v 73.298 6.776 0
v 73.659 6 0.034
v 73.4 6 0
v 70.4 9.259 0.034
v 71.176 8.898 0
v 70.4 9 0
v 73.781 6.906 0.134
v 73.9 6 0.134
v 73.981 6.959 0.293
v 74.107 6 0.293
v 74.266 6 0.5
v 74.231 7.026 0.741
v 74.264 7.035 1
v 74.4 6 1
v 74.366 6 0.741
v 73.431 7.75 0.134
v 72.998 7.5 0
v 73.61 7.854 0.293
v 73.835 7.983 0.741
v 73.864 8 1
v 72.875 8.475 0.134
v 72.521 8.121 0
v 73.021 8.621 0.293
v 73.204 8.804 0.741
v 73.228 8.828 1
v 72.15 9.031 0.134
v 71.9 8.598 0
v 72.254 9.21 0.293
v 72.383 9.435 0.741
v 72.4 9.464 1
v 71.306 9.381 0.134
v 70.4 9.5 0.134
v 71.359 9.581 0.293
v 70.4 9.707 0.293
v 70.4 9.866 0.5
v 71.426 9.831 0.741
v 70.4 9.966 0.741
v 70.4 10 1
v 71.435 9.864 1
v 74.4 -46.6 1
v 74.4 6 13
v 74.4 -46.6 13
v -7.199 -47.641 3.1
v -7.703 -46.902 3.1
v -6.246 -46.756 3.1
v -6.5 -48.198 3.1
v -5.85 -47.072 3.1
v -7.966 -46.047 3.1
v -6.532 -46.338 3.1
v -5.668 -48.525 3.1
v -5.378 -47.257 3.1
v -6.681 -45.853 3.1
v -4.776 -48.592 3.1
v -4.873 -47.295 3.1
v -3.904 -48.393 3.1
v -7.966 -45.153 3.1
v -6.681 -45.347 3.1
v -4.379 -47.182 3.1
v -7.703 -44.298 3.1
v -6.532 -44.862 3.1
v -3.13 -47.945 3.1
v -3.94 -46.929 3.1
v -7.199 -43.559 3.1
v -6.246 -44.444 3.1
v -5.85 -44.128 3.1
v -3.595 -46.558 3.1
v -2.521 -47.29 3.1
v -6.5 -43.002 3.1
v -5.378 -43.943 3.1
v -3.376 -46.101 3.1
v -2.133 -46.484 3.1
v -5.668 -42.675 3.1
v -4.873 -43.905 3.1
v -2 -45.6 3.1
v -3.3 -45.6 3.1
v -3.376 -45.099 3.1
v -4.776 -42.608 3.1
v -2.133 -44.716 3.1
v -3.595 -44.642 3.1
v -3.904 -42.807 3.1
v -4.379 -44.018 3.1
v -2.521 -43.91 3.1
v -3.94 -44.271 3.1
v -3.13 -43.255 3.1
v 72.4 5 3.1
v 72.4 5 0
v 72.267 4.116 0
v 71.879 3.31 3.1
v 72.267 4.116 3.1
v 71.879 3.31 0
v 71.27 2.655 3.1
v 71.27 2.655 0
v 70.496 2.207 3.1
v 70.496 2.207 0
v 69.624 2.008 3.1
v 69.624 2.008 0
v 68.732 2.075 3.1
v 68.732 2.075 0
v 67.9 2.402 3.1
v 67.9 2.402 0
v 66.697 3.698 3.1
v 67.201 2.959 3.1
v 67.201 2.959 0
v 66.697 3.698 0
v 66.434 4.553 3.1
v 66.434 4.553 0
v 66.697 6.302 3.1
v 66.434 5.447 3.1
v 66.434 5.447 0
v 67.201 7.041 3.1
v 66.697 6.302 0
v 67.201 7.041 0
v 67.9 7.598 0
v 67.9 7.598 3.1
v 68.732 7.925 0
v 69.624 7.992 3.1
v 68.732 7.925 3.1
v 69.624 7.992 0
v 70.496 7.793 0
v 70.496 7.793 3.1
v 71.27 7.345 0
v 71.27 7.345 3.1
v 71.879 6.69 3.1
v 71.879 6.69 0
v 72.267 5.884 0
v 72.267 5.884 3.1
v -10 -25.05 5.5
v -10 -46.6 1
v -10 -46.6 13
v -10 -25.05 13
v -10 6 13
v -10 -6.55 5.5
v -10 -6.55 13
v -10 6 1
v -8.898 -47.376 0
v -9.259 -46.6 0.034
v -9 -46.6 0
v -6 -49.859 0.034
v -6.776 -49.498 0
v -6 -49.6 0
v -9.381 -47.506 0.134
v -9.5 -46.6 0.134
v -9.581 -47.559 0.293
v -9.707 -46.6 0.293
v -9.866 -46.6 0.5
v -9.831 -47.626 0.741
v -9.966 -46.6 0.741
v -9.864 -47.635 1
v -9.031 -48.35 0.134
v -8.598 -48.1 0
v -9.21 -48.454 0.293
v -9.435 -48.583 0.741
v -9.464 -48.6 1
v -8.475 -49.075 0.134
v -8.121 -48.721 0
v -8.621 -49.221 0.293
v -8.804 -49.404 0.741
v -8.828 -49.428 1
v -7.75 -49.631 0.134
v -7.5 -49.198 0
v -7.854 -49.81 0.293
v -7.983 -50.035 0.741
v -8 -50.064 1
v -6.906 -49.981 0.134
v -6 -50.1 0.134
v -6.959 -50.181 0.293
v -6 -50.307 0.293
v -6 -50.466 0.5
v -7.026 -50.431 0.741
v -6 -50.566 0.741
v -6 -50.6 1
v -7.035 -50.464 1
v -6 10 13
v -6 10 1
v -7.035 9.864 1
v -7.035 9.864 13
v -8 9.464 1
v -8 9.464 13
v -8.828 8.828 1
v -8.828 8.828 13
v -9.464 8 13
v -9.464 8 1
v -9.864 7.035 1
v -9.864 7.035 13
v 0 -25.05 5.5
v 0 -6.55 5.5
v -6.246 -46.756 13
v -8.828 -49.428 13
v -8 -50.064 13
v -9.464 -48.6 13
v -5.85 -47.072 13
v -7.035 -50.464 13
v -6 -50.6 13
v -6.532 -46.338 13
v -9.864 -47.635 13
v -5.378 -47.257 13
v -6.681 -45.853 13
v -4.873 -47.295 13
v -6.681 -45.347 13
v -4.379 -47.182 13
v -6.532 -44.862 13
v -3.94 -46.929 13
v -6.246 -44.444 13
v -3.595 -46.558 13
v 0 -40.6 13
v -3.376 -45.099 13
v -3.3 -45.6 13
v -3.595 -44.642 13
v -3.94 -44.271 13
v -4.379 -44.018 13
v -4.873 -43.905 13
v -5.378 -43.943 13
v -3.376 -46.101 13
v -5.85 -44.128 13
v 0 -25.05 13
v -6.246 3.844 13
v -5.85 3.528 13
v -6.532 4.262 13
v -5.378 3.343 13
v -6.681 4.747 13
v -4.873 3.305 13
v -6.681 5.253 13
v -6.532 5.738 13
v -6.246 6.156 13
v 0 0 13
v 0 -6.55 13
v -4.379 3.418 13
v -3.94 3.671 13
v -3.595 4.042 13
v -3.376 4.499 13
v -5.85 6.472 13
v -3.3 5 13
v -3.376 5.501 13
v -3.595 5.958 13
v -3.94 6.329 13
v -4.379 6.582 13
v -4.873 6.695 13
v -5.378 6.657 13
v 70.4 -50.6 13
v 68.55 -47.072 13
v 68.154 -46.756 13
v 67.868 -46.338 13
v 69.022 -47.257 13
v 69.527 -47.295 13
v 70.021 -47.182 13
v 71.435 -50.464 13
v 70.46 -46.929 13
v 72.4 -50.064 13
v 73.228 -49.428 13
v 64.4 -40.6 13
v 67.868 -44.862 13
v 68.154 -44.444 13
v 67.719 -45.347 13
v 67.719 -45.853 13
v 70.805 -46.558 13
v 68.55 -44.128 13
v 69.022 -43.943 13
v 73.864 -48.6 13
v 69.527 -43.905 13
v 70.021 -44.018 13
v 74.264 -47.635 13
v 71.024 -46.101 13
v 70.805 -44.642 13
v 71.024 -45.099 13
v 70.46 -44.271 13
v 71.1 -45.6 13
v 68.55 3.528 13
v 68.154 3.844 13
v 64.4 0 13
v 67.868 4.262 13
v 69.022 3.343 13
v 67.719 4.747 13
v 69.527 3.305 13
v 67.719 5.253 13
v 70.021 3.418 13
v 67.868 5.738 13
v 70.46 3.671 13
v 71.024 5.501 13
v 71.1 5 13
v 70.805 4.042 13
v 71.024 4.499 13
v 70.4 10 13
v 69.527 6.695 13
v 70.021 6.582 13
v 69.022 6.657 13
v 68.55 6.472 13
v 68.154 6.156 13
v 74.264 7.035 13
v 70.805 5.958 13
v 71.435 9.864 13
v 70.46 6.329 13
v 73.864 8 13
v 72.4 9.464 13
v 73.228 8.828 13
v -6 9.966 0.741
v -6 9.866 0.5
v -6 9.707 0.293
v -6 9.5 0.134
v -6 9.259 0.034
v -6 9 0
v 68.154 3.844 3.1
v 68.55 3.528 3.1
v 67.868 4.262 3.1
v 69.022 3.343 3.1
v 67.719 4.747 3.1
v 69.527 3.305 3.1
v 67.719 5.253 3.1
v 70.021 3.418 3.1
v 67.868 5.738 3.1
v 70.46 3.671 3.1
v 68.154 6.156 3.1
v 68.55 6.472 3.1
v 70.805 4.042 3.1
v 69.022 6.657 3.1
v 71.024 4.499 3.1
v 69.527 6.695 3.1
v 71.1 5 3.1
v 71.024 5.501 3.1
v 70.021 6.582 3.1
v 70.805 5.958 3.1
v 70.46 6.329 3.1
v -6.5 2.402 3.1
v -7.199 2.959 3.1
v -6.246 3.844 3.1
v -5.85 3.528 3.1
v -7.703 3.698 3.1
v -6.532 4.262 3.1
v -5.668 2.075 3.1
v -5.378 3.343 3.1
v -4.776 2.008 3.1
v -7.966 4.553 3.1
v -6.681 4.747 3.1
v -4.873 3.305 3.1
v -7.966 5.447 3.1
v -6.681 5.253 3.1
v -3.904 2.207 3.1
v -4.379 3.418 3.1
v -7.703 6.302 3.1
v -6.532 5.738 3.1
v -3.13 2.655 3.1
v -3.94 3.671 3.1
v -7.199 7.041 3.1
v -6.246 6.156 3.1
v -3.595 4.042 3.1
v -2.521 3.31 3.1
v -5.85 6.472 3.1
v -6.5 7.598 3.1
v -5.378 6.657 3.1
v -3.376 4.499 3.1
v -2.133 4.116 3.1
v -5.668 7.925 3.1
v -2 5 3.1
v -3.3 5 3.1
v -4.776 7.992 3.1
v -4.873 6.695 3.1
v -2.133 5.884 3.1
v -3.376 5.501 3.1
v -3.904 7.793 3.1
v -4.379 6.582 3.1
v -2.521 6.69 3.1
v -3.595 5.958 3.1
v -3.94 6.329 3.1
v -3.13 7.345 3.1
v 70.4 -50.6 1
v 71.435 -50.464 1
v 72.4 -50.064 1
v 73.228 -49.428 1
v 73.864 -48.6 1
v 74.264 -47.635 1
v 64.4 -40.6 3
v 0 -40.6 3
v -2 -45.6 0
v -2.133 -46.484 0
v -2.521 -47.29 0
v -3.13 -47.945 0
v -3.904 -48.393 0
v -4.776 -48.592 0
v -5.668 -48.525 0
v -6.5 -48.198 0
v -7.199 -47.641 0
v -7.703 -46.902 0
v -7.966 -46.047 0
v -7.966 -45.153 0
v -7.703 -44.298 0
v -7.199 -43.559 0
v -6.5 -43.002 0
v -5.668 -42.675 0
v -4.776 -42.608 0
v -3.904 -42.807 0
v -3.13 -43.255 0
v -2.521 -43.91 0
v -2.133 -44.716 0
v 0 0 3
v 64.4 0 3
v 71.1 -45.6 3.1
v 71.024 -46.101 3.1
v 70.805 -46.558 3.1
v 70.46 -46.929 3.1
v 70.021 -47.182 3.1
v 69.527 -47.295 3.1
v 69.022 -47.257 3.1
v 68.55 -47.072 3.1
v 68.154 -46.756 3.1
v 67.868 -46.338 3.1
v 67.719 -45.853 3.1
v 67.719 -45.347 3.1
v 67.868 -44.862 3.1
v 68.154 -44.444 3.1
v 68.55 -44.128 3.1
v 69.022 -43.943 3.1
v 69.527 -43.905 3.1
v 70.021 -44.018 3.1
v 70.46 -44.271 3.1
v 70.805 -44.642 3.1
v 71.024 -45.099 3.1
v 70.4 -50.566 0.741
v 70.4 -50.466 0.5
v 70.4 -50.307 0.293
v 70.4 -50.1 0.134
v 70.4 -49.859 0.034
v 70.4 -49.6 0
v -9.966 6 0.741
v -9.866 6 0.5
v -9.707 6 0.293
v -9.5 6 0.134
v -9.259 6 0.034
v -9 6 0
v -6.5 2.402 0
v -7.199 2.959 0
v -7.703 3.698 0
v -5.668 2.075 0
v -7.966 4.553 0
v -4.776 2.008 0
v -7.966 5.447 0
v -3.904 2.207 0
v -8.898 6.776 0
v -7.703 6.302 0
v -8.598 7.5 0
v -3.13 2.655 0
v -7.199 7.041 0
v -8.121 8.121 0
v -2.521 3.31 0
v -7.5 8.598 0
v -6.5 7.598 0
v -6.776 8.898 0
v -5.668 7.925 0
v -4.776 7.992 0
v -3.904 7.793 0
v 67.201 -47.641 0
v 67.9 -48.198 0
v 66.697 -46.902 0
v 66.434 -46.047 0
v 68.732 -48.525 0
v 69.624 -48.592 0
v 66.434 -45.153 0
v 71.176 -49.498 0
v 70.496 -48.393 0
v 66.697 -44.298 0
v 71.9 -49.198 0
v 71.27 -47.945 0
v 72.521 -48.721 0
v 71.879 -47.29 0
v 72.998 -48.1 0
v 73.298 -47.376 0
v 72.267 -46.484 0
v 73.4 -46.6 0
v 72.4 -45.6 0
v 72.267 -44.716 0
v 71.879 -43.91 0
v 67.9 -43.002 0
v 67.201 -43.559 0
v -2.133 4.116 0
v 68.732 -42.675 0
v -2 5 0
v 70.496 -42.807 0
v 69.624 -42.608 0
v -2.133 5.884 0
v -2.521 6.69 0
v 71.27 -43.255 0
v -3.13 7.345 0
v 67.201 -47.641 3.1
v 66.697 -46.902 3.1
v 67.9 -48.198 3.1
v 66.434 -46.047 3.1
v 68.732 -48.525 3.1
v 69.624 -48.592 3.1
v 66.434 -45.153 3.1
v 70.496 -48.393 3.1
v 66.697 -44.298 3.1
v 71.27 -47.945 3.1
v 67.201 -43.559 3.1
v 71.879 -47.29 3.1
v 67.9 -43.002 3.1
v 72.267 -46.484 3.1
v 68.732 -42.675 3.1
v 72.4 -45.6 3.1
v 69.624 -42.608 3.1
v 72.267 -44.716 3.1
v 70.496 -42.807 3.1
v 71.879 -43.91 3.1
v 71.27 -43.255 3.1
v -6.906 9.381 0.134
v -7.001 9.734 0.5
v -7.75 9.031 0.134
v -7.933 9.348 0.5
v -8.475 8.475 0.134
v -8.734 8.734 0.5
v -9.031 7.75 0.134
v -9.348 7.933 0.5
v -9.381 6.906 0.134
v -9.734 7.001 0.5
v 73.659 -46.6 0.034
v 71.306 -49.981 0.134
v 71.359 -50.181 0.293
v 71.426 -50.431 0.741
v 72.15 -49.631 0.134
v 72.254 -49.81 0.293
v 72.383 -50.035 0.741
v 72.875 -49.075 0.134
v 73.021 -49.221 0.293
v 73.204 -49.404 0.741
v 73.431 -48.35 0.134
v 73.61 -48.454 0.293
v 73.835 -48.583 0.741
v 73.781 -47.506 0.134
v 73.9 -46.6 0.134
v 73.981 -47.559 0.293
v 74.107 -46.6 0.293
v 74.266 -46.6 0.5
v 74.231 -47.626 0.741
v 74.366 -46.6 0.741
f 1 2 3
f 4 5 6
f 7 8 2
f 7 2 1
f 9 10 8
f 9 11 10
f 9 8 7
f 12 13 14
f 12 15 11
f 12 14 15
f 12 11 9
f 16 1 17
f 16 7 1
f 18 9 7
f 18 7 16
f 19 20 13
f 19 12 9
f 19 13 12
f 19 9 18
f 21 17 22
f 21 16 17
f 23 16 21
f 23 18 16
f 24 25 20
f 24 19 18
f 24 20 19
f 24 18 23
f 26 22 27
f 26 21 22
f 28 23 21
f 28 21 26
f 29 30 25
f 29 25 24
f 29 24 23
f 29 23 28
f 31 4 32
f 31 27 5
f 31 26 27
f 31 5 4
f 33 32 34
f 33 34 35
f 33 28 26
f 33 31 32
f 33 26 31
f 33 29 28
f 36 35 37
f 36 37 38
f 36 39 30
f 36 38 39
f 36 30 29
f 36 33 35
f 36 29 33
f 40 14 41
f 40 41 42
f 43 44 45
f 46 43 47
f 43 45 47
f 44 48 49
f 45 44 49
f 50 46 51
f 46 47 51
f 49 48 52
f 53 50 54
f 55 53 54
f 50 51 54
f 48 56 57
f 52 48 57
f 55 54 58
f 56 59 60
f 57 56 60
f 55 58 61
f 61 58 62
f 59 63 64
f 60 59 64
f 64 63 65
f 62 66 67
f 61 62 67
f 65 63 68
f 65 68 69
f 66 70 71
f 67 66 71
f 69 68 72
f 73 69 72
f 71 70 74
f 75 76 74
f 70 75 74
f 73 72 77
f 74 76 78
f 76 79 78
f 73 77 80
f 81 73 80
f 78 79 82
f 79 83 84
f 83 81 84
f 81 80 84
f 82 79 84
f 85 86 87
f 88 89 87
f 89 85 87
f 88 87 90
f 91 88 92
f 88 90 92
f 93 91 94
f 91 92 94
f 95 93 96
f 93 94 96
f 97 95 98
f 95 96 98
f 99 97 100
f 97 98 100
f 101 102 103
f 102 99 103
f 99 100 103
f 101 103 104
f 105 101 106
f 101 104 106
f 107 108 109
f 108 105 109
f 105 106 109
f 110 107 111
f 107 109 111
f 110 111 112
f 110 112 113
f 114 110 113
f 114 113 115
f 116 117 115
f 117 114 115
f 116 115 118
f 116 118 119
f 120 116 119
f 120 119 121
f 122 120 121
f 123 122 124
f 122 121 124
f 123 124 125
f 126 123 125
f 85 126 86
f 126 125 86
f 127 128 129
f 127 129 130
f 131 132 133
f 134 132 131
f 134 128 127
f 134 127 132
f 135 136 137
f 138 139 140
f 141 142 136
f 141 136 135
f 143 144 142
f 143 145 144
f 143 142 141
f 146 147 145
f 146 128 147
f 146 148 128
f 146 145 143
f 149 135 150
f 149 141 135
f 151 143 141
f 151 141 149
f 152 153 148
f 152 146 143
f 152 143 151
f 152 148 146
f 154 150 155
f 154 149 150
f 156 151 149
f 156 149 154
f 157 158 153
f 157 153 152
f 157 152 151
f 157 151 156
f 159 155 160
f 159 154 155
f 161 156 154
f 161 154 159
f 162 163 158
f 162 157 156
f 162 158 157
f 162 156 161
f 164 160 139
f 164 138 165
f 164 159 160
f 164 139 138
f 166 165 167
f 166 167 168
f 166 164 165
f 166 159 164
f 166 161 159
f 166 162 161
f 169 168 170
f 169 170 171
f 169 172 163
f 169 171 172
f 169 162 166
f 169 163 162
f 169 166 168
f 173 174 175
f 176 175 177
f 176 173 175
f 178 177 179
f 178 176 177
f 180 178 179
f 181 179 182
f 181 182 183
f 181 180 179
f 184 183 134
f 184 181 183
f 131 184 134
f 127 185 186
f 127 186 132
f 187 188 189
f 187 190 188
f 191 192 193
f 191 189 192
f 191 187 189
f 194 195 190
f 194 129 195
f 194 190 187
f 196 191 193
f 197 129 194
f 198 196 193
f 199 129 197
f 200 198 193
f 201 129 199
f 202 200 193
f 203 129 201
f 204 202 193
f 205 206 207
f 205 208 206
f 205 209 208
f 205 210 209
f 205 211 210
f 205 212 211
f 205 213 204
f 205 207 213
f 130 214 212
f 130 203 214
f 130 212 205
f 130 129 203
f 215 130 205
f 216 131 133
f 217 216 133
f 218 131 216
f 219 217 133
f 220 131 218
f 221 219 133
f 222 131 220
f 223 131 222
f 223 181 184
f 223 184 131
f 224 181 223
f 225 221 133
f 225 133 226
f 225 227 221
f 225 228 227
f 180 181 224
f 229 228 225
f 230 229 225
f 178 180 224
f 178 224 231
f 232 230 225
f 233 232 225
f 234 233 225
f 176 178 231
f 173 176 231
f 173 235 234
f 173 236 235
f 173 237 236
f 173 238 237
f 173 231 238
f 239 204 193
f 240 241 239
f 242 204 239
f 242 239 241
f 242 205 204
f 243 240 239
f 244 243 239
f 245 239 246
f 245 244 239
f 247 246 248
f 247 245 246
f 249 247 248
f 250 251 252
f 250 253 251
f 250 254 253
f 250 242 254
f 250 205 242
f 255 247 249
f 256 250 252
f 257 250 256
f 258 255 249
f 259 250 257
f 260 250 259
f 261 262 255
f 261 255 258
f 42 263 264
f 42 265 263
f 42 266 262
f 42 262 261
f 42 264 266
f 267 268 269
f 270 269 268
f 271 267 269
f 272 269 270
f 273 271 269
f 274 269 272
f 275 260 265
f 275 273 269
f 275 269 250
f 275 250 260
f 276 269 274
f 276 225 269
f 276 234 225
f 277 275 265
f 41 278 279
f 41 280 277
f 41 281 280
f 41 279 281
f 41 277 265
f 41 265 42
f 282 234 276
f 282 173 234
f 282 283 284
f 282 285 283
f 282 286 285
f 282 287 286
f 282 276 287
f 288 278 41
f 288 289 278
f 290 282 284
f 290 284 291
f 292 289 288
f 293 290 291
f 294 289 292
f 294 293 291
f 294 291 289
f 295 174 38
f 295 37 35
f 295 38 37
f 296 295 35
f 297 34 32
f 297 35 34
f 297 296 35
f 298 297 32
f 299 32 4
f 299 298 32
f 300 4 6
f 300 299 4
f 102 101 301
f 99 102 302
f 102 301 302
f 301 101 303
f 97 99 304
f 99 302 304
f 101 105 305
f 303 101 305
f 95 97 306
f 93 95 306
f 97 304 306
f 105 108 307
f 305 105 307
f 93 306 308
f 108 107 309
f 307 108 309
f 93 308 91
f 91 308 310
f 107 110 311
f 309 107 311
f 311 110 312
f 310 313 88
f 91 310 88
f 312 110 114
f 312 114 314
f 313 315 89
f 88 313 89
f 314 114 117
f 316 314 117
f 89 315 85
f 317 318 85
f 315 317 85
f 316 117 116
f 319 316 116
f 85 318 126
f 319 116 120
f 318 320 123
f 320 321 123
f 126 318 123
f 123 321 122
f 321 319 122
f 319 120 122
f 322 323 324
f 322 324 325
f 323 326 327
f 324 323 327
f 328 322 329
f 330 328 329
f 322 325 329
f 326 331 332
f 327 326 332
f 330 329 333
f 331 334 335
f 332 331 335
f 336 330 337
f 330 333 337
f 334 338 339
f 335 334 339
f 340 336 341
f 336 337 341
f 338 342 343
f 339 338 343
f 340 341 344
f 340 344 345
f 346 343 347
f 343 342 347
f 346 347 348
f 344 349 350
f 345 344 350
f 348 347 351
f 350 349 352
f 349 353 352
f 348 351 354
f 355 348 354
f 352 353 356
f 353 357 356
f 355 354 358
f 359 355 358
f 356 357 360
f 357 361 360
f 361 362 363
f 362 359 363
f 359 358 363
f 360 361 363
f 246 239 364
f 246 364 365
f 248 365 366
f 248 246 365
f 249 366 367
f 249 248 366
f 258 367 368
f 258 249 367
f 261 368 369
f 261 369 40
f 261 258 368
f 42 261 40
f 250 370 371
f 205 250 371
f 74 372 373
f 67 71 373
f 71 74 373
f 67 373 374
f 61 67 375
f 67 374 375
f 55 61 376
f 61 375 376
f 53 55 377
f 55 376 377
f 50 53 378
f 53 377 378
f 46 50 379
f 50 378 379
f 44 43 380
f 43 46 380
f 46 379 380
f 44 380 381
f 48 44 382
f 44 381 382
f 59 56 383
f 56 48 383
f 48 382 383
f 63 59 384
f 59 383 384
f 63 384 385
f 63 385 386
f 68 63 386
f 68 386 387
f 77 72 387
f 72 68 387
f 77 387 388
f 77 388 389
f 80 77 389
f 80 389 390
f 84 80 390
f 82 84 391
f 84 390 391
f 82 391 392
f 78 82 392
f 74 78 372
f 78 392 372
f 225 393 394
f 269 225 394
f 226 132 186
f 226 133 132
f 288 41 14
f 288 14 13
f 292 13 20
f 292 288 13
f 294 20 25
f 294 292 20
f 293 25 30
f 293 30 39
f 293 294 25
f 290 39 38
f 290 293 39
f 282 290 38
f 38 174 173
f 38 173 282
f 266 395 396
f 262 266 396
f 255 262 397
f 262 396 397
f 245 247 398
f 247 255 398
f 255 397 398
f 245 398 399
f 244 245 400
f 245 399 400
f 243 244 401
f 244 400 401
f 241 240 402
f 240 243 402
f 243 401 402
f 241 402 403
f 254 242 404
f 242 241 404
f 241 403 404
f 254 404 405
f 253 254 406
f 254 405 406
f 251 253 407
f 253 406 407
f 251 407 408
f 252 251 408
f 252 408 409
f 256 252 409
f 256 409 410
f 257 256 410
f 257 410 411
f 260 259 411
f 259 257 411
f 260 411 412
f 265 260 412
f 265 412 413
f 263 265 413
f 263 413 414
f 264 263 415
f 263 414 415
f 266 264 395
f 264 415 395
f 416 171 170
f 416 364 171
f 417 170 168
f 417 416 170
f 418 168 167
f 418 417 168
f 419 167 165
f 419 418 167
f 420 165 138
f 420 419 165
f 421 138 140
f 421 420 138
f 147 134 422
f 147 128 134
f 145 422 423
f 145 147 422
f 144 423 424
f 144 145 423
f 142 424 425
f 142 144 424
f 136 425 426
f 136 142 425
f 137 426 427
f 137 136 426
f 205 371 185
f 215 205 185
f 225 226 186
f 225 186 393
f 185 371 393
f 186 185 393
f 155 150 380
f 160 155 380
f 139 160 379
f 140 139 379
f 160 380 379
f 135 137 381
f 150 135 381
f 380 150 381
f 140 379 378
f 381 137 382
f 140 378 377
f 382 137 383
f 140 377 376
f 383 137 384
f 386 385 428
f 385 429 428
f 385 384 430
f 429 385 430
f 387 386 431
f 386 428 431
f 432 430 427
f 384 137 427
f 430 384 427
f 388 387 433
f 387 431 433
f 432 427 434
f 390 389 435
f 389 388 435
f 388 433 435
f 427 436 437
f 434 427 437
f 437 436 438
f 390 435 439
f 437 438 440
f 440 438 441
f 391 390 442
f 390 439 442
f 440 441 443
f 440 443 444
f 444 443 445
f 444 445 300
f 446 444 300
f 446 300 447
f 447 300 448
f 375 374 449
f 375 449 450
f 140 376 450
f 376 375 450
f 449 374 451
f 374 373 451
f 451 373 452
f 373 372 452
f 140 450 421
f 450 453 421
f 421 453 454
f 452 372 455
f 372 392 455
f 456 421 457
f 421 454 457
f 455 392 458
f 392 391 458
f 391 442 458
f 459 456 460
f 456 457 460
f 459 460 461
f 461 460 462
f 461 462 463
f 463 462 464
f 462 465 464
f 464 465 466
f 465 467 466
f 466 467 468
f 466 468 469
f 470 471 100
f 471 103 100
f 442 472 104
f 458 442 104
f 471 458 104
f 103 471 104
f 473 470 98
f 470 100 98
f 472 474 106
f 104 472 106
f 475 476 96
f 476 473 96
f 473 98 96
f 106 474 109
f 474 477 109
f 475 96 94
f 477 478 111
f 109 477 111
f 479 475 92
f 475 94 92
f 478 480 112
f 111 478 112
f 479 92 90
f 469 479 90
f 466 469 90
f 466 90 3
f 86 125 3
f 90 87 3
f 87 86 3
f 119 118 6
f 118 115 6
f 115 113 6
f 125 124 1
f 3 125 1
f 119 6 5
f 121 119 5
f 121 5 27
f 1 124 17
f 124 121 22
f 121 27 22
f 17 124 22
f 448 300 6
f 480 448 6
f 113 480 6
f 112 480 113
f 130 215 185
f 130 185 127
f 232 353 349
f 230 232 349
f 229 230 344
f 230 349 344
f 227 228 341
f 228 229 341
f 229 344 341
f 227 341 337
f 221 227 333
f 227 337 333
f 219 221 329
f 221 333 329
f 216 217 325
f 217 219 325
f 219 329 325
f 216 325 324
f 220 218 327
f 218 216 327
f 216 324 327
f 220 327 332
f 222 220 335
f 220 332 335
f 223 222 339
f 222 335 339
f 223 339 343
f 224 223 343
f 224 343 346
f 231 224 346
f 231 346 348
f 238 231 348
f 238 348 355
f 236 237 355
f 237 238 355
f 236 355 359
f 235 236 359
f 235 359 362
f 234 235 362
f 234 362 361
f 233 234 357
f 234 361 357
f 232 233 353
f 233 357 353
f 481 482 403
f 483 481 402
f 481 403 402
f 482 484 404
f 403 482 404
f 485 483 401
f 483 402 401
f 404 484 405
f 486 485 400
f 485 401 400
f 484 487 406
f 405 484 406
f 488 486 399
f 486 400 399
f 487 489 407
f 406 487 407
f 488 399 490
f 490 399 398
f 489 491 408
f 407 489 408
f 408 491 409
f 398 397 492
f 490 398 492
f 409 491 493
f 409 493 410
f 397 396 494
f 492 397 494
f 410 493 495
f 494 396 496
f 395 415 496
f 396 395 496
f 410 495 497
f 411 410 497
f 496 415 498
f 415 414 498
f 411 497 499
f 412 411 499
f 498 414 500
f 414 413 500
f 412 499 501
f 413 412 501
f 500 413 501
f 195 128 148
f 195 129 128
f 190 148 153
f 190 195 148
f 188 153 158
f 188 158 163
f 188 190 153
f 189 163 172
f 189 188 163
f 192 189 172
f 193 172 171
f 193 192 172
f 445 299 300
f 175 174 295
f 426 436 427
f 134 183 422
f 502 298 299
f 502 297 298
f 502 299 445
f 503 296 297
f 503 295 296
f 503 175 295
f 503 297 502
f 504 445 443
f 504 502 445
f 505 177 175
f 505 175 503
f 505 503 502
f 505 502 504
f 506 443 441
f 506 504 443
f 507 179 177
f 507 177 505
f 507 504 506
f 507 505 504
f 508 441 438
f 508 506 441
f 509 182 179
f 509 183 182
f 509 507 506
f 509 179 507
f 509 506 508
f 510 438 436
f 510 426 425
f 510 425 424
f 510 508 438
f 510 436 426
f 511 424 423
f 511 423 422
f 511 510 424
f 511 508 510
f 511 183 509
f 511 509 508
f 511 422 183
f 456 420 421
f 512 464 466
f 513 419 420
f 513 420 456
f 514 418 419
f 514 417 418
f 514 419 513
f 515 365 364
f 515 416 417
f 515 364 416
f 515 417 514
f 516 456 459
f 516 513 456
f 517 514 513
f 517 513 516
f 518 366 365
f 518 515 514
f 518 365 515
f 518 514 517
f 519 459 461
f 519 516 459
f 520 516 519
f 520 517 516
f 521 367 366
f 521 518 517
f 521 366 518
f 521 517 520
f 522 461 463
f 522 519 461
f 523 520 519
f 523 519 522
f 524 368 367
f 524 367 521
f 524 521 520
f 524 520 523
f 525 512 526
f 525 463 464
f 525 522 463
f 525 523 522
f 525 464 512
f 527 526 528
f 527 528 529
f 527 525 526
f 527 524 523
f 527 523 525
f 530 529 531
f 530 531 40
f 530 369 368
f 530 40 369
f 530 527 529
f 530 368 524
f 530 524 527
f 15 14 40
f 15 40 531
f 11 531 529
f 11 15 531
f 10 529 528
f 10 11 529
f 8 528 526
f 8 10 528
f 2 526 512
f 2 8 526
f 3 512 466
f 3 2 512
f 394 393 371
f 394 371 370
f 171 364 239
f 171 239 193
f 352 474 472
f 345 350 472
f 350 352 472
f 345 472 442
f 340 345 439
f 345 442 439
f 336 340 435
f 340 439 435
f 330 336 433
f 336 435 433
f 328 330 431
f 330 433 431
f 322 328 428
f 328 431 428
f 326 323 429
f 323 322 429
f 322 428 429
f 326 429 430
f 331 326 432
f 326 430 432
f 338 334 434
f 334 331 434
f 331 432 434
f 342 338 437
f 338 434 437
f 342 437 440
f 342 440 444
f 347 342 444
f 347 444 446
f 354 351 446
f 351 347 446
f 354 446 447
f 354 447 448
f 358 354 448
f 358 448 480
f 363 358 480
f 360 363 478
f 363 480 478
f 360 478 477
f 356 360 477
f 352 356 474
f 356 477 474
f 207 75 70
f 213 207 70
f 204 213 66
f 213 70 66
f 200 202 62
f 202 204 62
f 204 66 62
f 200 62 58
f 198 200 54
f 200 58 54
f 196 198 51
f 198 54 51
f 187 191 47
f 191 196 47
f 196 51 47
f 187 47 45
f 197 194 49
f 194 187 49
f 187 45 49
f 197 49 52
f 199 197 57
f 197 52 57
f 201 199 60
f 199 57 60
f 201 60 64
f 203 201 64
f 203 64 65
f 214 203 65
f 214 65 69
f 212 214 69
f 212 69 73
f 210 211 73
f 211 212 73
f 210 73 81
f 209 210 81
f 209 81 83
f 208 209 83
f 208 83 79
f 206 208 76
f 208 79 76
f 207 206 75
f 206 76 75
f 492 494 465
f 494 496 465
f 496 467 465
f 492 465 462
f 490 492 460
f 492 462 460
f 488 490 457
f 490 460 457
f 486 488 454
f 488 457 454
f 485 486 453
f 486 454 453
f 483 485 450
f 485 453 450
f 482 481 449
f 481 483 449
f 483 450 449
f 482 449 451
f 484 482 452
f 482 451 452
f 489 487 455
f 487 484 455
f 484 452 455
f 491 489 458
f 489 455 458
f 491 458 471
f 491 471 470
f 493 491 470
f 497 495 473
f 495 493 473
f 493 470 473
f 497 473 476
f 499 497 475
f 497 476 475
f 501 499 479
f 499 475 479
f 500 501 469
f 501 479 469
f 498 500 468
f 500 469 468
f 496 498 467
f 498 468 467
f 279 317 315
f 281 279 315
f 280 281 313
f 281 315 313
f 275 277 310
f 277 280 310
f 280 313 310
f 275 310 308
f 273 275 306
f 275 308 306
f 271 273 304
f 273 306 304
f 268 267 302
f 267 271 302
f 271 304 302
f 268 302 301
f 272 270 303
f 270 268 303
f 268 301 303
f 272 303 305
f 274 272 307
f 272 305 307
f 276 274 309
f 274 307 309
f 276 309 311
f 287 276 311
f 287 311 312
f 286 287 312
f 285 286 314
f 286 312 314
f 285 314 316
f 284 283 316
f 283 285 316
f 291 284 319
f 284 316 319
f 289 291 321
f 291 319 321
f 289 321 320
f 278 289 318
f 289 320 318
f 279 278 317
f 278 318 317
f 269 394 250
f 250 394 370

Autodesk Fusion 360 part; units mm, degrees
sketch "Sketch1" plane through (0, 0, 0) normal (0, 0, 1) x (1, 0, 0) in component "Hackpad"
  line L0 (0, 0) -> (64.4, 0)
  line L1 (64.4, 0) -> (64.4, -40.6)
  line L2 (64.4, -40.6) -> (0, -40.6)
  line L3 (0, -40.6) -> (0, 0)
  line L4 (74.4, -50.6) -> (-10, -50.6)
  line L5 (-10, -50.6) -> (-10, 10)
  line L6 (-10, 10) -> (74.4, 10)
  line L7 (74.4, 10) -> (74.4, -50.6)
  circle A0 centre (-5, 5) radius 1.7
  circle A1 centre (69.4, 5) radius 1.7
  circle A2 centre (69.4, -45.6) radius 1.7
  circle A3 centre (-5, -45.6) radius 1.7
  circle A4 centre (-5, 5) radius 3
  circle A5 centre (69.4, 5) radius 3
  circle A6 centre (69.4, -45.6) radius 3
  circle A7 centre (-5, -45.6) radius 3
  dimension "d1" = 40.6
  dimension "d2" = 64.4
  dimension "d3" = -10
  dimension "d4" = 3.4
  dimension "d5" = 3.4
  dimension "d6" = 3.4
  dimension "d7" = 3.4
  dimension "d8" = 5
  dimension "d9" = 5
  dimension "d10" = 5
  dimension "d11" = 5
  dimension "d12" = 5
  dimension "d13" = 5
  dimension "d14" = 5
  dimension "d15" = 5
  dimension "d16" = 6
  dimension "d17" = 6
  dimension "d18" = 6
  dimension "d19" = 6
extrude "Extrude1" add sketch "Sketch1" along normal blind 9.9 from surface at 3.1 contours A4 | A5 | A6 | A7 makes body 1 at (70.2125, 7.8879, 9.7) makes body 2 at (70.2125, -42.7121, 9.7) makes body 3 at (-2.0037, 4.8505, 9.7) makes body 4 at (-2.0037, -45.7495, 9.7) in component "Hackpad"
extrude "Extrude2" add sketch "Sketch1" along normal blind 13 contours L4 L5 L6 L7 bodies 1 2 3 4 in component "Hackpad"
extrude "Extrude3" add sketch "Sketch1" along normal blind 3 contours L0 L1 L2 L3 bodies 1 in component "Hackpad"
sketch "Sketch2" plane through (0, 0, 13) normal (0, 0, 1) x (-1, 0, 0) in component "Hackpad"
  circle A0 centre (-69.4, -5) radius 1.7
  circle A1 centre (5, 45.6) radius 1.7
  line L0 (-64.4, 40.6) -> (0, 40.6)
  line L1 (0, 40.6) -> (0, 0)
  line L2 (0, 0) -> (-64.4, 0)
  line L3 (-64.4, 0) -> (-64.4, 40.6)
  line L4 (-74.4, -10) -> (10, -10)
  line L5 (10, -10) -> (10, 50.6)
  line L6 (10, 50.6) -> (-74.4, 50.6)
  line L7 (-74.4, 50.6) -> (-74.4, -10)
  circle A2 centre (-69.4, 45.6) radius 1.7
  circle A3 centre (5, -5) radius 1.7
  line L8 (10, 6.55) -> (0, 6.55)
  line L9 (0, 6.55) -> (0, 25.05)
  line L10 (0, 25.05) -> (10, 25.05)
  line L11 (10, 25.05) -> (10, 6.55)
  line L12 (-74.4, 50.6) -> (10, 50.6)
  dimension "d27" = 18.5
  dimension "d28" = 25.55
extrude "Extrude4" cut sketch "Sketch2" against normal blind 7.5 contours L1 L5 L8 L9 L10 L11 bodies 1 in component "Hackpad"
fillet "Fillet1" radius 4 4 edges at (-10, -50.6, 6.5) (74.4, -50.6, 6.5) (74.4, 10, 6.5) (-10, 10, 6.5) on bodies 1 in component "Hackpad"
fillet "Fillet2" radius 1 8 edges at (-8.8284, 8.8284, 0) (32.2, 10, 0) (73.2284, 8.8284, 0) (74.4, -20.3, 0) (73.2284, -49.4284, 0) (32.2, -50.6, 0) (-8.8284, -49.4284, 0) (-10, -20.3, 0) on bodies 1 in component "Hackpad"
component "Hackpad" placed x (1, 0, 0) y (0, 1, 0) z (0, 0, 1) at (0, 0, 0)
equation "d1 = 39.6 mm + 1 mm"
equation "d2 = 63.4 mm + 1 mm"
equation "d28 = 19.8 mm + 5.75 mm"
